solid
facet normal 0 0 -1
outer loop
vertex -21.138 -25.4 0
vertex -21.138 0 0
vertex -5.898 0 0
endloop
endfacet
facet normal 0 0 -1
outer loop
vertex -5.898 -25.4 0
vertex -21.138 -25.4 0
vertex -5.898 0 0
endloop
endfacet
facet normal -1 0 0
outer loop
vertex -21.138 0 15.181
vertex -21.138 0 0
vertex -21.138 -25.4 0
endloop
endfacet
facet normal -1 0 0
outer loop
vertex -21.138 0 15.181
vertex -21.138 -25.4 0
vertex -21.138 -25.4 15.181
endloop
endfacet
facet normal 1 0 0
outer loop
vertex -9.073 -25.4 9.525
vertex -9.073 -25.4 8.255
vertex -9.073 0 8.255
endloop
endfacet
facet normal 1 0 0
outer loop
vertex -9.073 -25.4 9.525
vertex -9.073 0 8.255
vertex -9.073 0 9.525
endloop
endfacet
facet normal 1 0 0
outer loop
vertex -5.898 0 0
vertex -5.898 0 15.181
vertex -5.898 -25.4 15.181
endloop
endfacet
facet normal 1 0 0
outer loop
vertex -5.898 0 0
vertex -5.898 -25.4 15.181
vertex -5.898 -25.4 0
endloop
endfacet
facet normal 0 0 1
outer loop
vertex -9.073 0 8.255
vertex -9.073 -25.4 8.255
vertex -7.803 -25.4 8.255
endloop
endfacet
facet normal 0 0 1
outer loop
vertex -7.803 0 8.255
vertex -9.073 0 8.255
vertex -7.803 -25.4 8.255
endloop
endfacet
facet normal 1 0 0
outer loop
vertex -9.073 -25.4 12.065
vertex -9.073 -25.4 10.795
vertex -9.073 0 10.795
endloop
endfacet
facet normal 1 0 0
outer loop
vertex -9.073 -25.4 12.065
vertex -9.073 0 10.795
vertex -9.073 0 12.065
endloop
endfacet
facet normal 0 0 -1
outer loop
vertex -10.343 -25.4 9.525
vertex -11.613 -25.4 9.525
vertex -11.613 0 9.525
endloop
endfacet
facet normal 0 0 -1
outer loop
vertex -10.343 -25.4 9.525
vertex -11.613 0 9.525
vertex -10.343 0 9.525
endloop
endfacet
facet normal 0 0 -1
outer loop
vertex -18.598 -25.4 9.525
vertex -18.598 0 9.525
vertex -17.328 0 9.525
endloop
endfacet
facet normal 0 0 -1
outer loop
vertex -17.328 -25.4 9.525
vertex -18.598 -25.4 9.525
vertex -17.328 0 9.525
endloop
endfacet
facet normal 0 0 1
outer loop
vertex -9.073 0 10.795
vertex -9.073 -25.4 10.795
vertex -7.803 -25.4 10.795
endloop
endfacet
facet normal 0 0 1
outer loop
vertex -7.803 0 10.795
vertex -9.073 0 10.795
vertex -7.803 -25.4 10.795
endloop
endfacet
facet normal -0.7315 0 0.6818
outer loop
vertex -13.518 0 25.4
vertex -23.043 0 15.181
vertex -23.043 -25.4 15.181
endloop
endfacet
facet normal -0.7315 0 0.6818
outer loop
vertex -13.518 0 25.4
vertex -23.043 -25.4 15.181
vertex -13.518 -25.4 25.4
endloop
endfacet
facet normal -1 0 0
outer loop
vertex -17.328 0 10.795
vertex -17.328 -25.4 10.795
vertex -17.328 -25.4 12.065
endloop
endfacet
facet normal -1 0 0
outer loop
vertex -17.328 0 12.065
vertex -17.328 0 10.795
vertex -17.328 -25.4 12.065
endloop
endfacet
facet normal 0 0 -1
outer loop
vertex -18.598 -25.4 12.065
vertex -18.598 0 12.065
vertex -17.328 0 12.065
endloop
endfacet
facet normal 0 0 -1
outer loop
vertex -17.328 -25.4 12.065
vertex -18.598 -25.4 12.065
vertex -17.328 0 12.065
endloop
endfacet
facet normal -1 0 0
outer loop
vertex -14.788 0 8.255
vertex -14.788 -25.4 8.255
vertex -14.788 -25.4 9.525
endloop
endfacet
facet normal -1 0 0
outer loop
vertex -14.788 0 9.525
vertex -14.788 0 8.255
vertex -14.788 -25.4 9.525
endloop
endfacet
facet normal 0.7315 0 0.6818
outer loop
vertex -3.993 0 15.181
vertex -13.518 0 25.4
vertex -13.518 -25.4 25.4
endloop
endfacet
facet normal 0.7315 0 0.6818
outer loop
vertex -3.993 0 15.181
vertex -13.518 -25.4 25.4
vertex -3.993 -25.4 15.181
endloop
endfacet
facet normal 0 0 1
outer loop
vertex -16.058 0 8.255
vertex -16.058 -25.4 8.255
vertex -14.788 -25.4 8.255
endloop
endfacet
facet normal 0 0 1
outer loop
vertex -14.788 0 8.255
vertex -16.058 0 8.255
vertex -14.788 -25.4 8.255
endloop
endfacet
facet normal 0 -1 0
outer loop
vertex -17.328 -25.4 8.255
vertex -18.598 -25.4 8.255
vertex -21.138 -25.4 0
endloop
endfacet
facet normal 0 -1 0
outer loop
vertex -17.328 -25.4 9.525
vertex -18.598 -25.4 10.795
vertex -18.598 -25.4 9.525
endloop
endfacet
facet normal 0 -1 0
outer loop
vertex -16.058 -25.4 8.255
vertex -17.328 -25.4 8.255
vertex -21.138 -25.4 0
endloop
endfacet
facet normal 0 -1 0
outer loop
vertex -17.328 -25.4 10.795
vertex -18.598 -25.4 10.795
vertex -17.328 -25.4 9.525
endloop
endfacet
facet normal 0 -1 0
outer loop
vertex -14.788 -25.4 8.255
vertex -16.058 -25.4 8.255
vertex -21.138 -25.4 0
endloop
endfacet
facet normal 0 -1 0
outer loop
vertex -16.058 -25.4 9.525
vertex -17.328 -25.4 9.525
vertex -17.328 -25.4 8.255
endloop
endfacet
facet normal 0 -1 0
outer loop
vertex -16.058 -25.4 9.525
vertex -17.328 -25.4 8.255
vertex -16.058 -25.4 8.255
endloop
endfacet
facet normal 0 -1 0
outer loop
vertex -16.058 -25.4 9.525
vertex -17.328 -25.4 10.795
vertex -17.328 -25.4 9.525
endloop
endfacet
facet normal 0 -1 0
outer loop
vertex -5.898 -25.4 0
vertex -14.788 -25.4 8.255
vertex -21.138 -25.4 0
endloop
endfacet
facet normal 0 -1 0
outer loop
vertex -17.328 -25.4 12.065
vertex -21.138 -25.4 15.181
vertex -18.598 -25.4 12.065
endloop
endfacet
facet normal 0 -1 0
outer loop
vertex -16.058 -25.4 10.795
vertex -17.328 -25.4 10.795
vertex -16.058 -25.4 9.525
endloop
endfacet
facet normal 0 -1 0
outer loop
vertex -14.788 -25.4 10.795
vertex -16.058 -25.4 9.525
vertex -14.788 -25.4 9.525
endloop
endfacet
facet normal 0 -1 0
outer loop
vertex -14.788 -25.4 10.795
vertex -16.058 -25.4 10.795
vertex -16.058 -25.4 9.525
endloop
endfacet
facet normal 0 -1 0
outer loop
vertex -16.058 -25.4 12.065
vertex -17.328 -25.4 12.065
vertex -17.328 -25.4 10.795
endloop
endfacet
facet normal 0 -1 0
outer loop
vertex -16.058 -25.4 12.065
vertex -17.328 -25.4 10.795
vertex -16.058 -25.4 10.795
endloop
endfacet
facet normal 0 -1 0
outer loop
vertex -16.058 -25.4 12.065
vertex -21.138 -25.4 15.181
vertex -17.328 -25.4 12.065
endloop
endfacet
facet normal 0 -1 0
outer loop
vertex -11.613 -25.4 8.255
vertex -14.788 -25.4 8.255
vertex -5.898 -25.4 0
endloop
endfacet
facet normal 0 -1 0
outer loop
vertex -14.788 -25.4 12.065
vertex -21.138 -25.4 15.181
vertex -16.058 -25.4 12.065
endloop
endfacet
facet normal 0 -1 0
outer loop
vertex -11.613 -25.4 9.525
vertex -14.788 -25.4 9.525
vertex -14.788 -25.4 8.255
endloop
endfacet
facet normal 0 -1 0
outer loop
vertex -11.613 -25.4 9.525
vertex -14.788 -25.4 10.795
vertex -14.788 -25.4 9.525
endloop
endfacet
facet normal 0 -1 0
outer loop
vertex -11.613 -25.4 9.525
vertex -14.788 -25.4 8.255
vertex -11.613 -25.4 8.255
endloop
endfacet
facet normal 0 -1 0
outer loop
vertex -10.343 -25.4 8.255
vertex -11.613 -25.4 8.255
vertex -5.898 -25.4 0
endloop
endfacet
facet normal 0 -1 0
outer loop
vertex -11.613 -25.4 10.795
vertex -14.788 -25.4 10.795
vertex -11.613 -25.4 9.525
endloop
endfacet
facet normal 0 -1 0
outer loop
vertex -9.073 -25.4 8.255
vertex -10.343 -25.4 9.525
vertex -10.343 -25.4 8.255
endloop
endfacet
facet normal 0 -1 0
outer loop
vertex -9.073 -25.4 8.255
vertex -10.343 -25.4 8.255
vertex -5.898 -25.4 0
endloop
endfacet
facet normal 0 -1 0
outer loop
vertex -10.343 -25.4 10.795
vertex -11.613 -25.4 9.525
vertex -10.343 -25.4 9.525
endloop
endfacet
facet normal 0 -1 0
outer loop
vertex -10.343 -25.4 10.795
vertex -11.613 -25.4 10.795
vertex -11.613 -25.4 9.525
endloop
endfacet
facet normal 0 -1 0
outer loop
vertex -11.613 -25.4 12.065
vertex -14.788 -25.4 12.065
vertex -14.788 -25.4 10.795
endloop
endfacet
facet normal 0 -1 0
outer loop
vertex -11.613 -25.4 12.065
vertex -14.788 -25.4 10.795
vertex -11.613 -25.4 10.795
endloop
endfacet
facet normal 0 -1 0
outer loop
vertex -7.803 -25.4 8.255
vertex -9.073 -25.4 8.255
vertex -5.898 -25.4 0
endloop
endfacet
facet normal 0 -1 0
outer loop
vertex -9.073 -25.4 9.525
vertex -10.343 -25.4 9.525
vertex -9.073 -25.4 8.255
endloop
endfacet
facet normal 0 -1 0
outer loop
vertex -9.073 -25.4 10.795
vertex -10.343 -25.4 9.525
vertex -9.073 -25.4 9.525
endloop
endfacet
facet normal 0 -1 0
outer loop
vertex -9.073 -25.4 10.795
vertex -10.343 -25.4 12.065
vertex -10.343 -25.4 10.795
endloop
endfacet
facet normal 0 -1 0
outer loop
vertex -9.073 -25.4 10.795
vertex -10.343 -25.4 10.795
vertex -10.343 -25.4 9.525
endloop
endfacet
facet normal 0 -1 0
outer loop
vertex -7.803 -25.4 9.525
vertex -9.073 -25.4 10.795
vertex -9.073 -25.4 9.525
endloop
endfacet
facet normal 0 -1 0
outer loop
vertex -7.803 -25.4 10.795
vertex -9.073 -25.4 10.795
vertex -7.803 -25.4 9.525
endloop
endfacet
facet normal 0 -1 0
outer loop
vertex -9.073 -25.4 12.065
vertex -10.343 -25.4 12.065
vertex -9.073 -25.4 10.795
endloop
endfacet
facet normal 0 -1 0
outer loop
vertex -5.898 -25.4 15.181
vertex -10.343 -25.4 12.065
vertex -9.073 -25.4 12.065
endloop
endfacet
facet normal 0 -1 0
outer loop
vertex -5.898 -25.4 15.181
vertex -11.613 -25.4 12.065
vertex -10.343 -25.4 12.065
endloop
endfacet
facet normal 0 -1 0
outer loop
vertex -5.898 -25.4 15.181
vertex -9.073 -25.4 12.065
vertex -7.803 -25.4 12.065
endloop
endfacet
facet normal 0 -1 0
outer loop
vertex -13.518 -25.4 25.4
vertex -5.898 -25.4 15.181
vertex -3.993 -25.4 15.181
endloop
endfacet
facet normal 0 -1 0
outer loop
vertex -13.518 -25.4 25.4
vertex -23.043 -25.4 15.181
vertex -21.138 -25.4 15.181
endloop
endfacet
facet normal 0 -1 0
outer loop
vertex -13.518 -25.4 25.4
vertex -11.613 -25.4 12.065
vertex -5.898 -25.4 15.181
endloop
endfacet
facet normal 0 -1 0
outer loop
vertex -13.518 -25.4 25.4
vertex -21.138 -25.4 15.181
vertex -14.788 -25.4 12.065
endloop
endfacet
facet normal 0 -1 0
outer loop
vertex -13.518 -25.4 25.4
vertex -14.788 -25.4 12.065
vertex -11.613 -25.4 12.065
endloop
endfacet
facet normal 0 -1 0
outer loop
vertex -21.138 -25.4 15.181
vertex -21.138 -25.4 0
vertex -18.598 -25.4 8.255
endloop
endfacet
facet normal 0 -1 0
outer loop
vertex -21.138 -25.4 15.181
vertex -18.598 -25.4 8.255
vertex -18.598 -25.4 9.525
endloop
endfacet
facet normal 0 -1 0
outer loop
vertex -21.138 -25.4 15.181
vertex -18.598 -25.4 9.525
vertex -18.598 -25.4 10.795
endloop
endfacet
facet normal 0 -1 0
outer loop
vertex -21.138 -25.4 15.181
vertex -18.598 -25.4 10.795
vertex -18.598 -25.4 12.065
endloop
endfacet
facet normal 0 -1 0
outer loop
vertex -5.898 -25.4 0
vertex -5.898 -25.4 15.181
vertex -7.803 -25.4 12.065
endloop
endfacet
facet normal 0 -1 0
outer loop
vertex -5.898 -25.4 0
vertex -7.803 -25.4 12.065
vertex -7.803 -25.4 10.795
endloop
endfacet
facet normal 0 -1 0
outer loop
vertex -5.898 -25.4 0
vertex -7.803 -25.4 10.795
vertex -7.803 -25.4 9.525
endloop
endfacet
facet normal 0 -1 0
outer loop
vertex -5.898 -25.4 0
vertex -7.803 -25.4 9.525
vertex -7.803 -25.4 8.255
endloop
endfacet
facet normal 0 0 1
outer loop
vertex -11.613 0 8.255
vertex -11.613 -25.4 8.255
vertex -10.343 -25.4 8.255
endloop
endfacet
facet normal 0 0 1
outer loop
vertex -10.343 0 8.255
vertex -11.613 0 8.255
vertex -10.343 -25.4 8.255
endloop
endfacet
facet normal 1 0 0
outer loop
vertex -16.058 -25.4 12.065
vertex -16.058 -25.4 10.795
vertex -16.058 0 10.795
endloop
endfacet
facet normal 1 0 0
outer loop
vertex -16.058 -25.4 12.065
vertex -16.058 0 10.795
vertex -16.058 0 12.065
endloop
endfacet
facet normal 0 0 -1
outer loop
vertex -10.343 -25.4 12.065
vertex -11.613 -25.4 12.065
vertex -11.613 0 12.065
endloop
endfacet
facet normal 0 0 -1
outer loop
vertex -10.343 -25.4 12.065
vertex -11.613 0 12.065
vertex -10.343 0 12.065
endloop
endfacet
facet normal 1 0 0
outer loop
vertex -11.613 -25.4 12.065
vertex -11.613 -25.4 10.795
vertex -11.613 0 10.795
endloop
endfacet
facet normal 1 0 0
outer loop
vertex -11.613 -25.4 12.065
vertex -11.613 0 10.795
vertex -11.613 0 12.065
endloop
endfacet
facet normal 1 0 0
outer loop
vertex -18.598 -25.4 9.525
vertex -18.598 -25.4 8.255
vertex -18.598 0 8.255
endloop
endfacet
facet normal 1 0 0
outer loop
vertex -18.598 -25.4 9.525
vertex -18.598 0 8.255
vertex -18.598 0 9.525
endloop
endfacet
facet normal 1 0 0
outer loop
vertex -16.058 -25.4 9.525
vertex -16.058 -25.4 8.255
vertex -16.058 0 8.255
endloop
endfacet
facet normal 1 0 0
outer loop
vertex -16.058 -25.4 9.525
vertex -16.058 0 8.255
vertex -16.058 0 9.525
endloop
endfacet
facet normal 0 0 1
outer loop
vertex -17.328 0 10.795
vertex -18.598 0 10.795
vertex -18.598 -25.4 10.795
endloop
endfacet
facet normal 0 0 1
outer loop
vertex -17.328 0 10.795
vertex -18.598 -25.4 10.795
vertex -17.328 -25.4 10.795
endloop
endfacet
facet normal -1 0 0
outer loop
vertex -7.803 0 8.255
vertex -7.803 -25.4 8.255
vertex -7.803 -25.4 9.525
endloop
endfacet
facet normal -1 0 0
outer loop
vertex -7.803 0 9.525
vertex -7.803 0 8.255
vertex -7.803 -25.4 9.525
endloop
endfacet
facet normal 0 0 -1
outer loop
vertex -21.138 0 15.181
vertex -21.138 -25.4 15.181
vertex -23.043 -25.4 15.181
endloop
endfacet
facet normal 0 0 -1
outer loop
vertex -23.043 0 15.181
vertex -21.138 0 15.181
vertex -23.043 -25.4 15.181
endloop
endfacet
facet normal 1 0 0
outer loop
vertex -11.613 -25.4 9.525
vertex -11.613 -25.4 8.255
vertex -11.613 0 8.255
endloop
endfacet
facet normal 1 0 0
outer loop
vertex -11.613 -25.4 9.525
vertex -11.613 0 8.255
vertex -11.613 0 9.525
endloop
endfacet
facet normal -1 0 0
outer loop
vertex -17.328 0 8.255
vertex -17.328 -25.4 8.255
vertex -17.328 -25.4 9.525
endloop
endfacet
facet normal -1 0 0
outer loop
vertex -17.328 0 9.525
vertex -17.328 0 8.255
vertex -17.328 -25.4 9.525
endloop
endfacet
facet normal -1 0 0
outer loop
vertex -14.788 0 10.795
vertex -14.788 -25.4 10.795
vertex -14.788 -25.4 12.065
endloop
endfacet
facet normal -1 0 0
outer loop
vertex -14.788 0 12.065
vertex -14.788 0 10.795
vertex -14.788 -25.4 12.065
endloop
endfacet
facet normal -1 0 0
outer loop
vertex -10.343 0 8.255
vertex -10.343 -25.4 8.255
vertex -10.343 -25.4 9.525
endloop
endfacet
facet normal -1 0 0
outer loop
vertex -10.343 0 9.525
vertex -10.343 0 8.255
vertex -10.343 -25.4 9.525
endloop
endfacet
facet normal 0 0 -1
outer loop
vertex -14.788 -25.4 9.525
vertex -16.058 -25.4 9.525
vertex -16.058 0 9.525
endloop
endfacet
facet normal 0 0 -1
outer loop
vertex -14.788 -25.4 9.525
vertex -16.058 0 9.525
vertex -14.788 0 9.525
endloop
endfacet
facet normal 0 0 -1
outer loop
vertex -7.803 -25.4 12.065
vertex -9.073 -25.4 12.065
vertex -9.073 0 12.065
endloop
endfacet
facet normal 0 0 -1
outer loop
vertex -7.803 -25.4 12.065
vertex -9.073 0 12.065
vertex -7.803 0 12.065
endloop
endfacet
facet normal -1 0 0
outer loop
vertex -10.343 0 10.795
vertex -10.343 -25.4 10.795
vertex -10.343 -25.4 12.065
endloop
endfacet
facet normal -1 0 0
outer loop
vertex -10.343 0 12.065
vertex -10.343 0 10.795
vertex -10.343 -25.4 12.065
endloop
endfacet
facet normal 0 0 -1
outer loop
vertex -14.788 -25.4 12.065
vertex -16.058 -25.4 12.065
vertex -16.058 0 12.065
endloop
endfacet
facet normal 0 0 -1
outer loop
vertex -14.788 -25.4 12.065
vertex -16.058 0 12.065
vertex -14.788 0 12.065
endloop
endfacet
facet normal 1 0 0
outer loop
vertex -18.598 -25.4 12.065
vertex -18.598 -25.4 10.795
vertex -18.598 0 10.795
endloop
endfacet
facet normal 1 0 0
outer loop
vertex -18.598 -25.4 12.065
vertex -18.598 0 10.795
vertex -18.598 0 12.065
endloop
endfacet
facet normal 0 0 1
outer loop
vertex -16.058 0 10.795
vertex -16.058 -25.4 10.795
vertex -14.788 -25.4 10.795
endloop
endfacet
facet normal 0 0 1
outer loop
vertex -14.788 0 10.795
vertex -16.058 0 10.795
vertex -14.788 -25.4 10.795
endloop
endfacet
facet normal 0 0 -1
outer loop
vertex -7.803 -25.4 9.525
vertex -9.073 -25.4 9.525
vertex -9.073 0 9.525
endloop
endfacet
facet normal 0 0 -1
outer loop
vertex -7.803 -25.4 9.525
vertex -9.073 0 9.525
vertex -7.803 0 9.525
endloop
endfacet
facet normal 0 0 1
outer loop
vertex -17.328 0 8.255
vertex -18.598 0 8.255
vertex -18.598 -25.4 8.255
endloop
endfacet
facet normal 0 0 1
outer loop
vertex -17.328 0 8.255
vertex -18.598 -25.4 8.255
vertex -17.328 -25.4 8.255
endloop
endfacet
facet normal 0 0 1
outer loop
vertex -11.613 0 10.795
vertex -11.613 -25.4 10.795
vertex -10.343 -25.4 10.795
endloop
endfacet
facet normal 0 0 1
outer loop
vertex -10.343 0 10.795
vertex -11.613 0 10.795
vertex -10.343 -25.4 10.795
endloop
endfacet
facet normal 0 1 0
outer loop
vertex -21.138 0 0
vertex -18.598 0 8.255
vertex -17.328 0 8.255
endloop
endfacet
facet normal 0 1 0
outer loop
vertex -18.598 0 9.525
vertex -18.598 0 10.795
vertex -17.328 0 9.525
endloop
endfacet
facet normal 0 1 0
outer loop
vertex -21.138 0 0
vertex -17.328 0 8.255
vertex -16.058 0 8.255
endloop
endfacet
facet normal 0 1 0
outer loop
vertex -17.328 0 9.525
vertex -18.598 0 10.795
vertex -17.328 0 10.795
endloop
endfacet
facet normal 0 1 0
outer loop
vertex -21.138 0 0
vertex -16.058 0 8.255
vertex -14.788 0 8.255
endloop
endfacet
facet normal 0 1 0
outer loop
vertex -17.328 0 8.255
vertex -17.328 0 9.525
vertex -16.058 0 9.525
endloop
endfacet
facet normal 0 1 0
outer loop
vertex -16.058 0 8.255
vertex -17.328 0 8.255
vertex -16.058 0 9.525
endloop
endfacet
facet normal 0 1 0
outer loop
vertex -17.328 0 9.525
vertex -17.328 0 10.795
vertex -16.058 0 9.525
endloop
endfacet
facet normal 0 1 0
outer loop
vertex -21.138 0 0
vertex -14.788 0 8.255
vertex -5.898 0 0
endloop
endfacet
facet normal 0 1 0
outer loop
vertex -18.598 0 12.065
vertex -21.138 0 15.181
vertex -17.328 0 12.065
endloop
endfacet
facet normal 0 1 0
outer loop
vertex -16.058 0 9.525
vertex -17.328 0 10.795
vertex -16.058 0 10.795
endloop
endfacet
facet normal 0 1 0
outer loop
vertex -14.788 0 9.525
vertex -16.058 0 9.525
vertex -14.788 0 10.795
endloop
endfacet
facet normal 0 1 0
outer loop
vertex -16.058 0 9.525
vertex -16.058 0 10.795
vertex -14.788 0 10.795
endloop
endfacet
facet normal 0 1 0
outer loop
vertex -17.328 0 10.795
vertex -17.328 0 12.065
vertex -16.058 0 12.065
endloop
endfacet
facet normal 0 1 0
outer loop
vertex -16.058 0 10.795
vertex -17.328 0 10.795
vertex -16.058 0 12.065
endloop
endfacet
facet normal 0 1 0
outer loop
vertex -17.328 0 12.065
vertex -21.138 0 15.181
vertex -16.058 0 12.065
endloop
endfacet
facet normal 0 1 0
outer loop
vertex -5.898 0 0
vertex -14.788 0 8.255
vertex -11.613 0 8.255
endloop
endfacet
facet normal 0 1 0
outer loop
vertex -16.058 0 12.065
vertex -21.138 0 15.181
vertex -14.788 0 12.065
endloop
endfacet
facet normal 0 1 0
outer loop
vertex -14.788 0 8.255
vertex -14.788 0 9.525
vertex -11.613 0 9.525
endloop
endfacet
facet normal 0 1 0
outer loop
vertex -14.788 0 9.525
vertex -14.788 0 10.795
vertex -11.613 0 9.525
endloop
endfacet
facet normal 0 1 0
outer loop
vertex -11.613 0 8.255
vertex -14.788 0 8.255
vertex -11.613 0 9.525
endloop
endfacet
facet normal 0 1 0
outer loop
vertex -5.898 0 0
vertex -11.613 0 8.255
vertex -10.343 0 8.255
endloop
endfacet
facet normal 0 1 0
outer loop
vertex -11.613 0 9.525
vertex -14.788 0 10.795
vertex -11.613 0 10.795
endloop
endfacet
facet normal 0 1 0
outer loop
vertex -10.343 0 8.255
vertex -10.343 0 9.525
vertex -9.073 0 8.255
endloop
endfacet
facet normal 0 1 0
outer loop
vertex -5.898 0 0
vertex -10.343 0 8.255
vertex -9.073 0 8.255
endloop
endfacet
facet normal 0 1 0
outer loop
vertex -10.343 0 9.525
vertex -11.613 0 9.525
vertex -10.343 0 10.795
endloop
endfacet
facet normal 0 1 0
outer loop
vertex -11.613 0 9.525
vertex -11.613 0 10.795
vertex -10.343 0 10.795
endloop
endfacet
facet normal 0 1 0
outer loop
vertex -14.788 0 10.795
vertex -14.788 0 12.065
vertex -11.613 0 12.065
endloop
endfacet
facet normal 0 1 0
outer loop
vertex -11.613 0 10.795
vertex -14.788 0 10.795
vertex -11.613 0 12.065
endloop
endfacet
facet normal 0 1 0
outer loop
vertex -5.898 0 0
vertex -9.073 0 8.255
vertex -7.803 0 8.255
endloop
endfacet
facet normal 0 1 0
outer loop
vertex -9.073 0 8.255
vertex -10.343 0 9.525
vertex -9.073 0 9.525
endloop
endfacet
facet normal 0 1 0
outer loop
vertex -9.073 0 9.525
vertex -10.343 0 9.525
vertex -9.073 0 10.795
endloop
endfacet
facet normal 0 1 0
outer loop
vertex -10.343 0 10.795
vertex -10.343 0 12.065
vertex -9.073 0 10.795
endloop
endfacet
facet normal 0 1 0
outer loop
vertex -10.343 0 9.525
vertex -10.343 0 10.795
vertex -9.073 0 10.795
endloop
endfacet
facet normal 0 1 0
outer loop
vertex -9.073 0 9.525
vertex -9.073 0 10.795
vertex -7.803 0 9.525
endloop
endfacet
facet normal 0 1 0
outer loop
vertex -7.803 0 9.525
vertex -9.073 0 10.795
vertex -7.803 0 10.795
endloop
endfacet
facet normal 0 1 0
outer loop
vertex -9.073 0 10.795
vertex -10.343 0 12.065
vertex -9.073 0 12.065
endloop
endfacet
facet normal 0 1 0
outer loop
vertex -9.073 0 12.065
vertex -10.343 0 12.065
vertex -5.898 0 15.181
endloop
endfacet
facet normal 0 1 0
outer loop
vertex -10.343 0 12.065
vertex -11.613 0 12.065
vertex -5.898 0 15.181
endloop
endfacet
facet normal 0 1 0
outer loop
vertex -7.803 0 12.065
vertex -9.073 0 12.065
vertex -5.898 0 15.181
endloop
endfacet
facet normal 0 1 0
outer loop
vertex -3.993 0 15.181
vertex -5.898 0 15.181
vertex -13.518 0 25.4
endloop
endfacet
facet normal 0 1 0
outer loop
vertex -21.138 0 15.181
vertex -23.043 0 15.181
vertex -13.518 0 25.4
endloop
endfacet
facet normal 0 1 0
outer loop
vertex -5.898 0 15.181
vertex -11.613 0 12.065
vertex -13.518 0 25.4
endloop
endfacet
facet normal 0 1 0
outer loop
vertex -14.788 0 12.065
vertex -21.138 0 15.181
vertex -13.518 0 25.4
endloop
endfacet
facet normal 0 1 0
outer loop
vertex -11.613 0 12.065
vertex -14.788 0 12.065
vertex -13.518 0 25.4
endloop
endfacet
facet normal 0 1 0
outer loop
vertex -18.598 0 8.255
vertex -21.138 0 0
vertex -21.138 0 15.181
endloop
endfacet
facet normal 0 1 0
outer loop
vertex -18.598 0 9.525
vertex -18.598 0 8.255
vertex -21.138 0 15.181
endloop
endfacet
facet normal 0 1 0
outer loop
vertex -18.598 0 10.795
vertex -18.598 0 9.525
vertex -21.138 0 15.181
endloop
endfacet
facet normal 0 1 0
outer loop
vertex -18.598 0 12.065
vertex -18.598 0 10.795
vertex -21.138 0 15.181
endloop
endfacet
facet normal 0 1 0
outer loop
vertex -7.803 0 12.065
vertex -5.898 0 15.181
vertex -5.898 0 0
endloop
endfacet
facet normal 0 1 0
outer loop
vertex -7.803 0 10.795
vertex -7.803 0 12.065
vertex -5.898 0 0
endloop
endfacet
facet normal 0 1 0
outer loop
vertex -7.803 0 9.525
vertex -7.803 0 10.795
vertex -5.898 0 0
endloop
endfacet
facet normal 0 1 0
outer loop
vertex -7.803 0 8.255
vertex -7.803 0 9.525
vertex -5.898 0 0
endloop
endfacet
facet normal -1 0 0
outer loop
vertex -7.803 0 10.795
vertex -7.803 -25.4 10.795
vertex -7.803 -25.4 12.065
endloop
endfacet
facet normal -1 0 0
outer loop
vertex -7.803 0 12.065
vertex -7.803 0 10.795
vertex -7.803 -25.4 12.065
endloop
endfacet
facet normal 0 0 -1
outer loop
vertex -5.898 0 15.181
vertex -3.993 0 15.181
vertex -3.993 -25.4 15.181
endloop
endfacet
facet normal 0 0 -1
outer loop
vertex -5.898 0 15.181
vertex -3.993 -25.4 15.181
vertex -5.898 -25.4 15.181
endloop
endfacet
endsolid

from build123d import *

# Parameters (mm, degrees)
F0_W     = 25.4
F0_H     = 25.4
F1_DEPTH = 25.4
F3_DEPTH = 25.4
F2_W     = 1.27
F2_H     = 1.27
F4_DEPTH = 25.4


# Not quite as in the source:
# - the program builds the solid bodies; features that only make, move or delete a surface that nothing else refers to are left out


with BuildPart() as f1:
    # F0 (on Front) → F1 (new body)
    with BuildSketch(Plane.XZ):
        with Locations((-12.7, 12.7)):
            Rectangle(F0_W, F0_H)
    extrude(amount=F1_DEPTH)

    # F2 (on face) → F3 (cut)
    with BuildSketch(Plane.XZ):
        Polygon((-3.9930980909, 15.1806421435), (-5.8980980909, 15.1806421435), (-5.8980980909, 0), (0, 0), (0, 25.4), (-13.5180980909, 25.4), align=None)
        Polygon((-25.4, 0), (-21.1380980909, 0), (-21.1380980909, 15.1806421435), (-23.0430980909, 15.1806421435), (-13.5180980909, 25.4), (-25.4, 25.4), align=None)
    extrude(amount=F3_DEPTH, mode=Mode.SUBTRACT)

    # F2 (on face) → F4 (cut)
    with BuildSketch(Plane.XZ):
        with Locations((-17.9630980909, 11.43)):
            Rectangle(F2_W, F2_H)
        with Locations((-17.9630980909, 8.89)):
            Rectangle(F2_W, F2_H)
        with Locations((-15.4230980909, 11.43)):
            Rectangle(F2_W, F2_H)
        with Locations((-15.4230980909, 8.89)):
            Rectangle(F2_W, F2_H)
        with Locations((-10.9780980909, 8.89)):
            Rectangle(F2_W, F2_H)
        with Locations((-8.4380980909, 8.89)):
            Rectangle(F2_W, F2_H)
        with Locations((-10.9780980909, 11.43)):
            Rectangle(F2_W, F2_H)
        with Locations((-8.4380980909, 11.43)):
            Rectangle(F2_W, F2_H)
    extrude(amount=F4_DEPTH, mode=Mode.SUBTRACT)


solid = f1.part
